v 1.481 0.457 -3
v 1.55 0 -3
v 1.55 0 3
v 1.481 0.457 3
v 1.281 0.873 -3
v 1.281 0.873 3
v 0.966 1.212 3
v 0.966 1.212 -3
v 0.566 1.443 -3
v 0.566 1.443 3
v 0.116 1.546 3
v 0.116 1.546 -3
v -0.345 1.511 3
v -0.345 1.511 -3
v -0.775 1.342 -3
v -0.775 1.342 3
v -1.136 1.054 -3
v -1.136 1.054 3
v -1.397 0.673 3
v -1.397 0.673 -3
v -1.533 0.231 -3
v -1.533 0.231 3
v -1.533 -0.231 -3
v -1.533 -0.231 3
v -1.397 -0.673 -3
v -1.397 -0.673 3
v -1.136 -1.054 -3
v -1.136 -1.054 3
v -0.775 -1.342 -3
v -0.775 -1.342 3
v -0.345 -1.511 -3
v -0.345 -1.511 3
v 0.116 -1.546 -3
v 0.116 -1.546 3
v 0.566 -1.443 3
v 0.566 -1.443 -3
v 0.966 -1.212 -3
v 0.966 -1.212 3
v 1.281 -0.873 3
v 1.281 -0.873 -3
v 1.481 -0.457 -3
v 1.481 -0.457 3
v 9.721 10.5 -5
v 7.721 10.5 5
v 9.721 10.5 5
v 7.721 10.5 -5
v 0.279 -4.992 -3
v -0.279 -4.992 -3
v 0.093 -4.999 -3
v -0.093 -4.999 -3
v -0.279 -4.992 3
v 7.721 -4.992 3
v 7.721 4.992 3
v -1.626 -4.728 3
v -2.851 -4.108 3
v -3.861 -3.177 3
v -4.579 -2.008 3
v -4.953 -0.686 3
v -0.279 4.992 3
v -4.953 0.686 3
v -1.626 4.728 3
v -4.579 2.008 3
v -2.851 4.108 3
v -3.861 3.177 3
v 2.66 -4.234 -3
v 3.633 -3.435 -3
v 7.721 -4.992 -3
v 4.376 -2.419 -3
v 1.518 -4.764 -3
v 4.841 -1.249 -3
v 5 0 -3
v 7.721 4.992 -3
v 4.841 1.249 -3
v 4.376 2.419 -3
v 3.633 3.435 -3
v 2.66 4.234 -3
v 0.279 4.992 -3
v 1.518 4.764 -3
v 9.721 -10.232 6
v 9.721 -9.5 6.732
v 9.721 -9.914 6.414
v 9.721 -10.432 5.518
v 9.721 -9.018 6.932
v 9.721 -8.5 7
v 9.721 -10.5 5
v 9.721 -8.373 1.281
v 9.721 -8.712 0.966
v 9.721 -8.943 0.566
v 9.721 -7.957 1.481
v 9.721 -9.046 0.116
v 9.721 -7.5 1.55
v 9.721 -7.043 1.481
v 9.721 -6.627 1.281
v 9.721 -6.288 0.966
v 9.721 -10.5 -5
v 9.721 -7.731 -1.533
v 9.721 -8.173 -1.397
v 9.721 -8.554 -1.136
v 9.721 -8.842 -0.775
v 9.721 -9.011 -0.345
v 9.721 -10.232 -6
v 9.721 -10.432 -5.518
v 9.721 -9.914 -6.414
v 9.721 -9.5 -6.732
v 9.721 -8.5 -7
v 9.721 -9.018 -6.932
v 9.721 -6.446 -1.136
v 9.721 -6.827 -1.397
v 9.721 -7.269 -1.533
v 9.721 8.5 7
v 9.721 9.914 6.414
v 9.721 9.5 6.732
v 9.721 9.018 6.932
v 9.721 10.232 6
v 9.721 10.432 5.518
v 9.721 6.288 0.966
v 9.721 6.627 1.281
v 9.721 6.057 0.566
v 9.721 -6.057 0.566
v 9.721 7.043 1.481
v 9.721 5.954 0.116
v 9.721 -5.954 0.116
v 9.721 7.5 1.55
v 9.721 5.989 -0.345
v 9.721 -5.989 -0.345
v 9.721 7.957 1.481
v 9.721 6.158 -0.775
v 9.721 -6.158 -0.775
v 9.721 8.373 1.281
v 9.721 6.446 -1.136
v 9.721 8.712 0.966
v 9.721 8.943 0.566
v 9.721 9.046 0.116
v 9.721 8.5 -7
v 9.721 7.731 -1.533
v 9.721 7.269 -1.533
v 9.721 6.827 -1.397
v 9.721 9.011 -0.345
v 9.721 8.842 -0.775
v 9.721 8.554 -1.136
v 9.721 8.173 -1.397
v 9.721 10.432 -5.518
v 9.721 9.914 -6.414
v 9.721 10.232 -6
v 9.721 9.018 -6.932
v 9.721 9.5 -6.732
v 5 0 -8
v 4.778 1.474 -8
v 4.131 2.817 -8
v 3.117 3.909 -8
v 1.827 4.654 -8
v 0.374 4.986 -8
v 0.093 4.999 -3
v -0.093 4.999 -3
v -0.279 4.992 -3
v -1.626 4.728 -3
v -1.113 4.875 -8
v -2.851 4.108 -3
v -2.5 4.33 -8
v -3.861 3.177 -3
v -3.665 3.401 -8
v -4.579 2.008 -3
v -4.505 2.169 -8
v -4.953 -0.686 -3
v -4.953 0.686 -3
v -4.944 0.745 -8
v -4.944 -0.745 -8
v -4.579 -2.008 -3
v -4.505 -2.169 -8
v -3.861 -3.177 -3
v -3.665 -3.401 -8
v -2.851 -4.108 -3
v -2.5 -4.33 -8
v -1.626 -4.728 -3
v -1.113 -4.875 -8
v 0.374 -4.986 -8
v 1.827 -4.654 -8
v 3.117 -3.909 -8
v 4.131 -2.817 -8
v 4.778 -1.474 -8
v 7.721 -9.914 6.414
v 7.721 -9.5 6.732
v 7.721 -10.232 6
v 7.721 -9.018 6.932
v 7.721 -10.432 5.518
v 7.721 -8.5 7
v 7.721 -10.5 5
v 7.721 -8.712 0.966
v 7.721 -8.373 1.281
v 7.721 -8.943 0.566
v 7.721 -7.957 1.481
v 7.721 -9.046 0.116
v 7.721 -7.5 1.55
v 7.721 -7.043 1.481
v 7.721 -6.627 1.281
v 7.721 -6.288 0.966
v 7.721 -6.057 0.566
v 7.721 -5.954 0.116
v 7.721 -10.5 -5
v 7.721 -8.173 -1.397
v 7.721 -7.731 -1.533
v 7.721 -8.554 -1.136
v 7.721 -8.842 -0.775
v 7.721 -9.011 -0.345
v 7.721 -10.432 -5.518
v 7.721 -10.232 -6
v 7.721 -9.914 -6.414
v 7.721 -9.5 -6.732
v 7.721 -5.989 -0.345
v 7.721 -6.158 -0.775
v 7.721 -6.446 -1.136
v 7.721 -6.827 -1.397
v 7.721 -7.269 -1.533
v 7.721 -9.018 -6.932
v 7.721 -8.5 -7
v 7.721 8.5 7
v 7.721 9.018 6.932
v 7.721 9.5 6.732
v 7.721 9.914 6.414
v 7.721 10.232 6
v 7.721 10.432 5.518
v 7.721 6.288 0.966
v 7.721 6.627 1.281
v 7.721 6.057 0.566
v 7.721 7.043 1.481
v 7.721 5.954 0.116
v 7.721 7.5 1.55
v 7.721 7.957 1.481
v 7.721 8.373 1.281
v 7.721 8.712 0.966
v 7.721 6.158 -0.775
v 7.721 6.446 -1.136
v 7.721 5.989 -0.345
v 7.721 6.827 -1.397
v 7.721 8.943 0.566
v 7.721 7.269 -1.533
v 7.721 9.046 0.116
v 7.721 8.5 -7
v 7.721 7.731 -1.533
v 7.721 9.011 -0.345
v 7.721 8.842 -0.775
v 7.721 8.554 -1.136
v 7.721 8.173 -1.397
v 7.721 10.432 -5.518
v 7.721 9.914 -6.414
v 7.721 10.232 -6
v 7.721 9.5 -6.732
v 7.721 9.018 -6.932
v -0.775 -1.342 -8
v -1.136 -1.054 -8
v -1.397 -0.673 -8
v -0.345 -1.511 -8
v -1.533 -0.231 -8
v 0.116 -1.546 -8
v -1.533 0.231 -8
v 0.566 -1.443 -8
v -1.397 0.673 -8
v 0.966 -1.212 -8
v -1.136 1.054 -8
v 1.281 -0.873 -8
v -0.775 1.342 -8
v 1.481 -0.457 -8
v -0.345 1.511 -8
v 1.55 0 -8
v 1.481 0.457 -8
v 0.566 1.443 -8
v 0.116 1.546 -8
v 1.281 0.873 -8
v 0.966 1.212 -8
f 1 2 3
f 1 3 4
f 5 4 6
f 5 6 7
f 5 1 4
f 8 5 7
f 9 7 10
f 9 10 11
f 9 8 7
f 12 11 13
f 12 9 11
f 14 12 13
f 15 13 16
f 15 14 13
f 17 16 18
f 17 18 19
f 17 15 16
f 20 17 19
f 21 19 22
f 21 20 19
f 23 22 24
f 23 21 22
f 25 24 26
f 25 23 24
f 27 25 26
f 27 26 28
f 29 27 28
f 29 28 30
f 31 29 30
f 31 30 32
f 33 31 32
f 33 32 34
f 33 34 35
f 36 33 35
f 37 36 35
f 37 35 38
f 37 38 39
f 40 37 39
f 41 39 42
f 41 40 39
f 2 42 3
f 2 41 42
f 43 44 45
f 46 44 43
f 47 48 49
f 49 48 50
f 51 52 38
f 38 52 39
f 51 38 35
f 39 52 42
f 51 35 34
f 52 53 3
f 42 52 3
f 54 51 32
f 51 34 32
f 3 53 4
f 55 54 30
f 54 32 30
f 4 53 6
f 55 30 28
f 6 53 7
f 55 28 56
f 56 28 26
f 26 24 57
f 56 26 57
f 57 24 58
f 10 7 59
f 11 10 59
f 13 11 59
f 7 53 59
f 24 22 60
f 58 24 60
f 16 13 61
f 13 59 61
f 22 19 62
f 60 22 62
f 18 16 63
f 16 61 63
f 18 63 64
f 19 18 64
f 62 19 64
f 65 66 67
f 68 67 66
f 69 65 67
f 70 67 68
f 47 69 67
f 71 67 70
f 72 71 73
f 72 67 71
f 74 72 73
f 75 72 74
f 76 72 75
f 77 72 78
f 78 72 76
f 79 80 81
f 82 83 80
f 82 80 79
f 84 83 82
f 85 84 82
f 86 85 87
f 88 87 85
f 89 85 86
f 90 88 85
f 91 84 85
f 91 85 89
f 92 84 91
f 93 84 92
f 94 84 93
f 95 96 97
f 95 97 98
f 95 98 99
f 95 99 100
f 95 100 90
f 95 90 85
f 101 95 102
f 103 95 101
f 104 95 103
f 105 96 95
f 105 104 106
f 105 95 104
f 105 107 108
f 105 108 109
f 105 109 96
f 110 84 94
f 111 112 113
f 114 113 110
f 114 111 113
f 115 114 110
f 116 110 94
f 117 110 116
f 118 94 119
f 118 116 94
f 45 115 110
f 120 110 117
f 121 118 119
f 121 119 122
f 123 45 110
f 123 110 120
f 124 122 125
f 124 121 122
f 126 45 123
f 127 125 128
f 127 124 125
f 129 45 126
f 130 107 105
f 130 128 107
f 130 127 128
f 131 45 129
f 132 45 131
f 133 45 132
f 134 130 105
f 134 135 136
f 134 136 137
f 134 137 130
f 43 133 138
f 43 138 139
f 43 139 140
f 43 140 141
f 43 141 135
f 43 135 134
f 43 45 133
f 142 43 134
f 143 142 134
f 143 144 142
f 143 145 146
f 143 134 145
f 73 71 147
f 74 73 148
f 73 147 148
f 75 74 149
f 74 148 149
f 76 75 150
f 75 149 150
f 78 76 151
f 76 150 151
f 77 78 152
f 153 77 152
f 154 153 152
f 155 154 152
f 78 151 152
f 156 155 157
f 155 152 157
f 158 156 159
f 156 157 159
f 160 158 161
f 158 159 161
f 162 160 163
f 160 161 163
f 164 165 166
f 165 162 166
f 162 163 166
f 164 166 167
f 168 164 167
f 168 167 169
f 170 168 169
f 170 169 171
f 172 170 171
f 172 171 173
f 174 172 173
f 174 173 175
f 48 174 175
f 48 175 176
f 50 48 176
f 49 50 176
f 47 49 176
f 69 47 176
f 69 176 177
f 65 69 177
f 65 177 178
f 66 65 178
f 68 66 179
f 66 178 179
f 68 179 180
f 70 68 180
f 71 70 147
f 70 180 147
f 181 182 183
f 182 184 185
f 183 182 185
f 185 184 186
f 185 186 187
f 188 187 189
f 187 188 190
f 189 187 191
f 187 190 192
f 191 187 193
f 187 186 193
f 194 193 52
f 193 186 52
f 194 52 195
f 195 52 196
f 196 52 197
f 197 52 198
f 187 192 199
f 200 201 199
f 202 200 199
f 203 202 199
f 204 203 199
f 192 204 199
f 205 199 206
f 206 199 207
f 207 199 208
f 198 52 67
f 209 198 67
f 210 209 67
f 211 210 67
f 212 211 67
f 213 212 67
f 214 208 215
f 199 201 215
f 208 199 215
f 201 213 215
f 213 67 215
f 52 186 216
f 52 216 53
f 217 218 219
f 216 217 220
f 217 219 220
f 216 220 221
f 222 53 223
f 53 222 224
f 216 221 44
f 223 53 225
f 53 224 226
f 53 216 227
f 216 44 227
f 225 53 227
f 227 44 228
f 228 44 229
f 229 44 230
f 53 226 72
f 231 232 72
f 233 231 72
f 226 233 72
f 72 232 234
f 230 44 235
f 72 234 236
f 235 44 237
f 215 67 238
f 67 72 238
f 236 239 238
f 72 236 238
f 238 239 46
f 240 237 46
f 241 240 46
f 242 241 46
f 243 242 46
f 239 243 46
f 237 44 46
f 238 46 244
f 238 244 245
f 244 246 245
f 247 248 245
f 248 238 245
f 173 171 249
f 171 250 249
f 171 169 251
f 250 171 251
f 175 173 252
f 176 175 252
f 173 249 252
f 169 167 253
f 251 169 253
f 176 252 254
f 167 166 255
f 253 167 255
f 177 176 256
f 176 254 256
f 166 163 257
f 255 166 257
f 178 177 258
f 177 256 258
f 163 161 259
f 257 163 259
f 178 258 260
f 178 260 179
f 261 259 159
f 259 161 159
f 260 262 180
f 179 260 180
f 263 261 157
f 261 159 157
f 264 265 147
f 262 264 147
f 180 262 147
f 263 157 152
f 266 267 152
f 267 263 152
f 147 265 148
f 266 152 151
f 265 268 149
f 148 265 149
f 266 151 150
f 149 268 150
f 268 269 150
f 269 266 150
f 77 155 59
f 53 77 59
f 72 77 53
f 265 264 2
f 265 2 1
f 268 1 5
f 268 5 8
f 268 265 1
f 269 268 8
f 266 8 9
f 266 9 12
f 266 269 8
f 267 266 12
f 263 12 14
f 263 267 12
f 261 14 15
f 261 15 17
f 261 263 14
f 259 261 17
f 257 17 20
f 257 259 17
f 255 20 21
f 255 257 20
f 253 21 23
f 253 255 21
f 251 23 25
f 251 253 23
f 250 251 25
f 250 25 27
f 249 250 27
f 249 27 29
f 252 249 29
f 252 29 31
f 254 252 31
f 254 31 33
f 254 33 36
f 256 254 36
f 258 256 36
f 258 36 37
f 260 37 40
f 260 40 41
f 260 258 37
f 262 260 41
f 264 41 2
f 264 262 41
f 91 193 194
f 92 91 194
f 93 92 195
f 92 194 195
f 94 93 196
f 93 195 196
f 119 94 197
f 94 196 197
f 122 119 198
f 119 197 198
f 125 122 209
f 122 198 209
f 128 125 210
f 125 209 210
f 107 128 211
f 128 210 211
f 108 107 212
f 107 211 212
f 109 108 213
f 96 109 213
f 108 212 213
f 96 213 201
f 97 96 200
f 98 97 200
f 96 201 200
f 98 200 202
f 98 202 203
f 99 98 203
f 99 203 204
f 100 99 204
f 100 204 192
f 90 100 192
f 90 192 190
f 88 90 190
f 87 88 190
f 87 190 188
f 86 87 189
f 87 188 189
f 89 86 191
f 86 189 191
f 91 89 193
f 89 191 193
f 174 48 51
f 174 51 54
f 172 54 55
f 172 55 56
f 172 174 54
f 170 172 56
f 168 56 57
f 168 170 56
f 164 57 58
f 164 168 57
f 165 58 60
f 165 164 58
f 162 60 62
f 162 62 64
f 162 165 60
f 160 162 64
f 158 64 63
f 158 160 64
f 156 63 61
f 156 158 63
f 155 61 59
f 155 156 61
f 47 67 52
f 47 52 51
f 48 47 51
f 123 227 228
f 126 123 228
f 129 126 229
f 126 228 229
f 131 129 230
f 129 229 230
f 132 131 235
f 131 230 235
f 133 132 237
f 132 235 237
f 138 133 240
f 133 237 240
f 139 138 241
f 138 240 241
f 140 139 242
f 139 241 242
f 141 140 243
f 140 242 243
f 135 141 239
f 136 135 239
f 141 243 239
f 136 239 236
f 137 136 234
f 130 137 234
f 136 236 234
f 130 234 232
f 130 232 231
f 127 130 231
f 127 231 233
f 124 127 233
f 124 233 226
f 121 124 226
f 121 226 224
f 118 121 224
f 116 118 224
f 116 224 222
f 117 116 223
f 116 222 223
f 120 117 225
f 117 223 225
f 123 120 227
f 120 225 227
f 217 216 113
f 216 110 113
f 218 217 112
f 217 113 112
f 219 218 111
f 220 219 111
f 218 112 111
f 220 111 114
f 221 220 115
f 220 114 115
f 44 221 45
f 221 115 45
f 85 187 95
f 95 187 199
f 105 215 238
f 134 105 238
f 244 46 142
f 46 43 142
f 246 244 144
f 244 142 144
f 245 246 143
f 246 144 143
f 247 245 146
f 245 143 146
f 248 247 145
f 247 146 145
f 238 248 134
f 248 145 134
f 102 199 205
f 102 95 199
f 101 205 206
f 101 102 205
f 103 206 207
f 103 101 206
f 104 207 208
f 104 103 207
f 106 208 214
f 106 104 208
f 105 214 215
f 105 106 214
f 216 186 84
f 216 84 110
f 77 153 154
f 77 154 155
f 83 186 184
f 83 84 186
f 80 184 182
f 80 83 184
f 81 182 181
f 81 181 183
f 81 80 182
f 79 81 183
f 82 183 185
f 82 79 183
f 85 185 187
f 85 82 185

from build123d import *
from build123d.topology import SkipClean

# Parameters (mm, degrees)
BOSS_EXTRU_1_DEPTH      = 3
BOSS_EXTRU_1_DEPTH_BACK = 3
ESQUISSE1_R             = 1.55
SKETCH1_W               = 14
SKETCH1_H               = 21
BOSS_EXTRUDE1_DEPTH     = 2
SKETCH3_R               = 1.55
CUT_EXTRUDE1_DEPTH      = 2
FILLET1_R               = 2
BOSS_EXTRUDE3_START     = -5
SKETCH4_R               = 5
SKETCH4_R_2             = 1.55
BOSS_EXTRUDE3_DEPTH     = 5


with BuildPart() as part:
    # Esquisse1 → Boss.-Extru.1 (new, two sides: drawn at the far end of the back side and taken through both)
    with BuildSketch(Plane.XY.offset(-BOSS_EXTRU_1_DEPTH_BACK)):
        with BuildLine():
            Line((-0.279242011, 4.9921963), (7.720757989, 4.9921963))
            Line((7.720757989, 4.9921963), (7.720757989, -4.9921963))
            Line((7.720757989, -4.9921963), (-0.279242011, -4.9921963))
            ThreePointArc((-0.279242011, -4.9921963), (-5, 0), (-0.279242011, 4.9921963))
        make_face()
        Circle(ESQUISSE1_R, mode=Mode.SUBTRACT)
    extrude(amount=BOSS_EXTRU_1_DEPTH + BOSS_EXTRU_1_DEPTH_BACK)

    # Sketch1 → Boss-Extrude1 (add)
    with BuildSketch(Plane(origin=(7.720757989, 0, 0), x_dir=(0, 0, -1), z_dir=(1, 0, 0))):
        Rectangle(SKETCH1_W, SKETCH1_H)
    extrude(amount=BOSS_EXTRUDE1_DEPTH)

    # Sketch3 → Cut-Extrude1 (cut)
    with BuildSketch(Plane.ZY.offset(-7.720757989)):
        with Locations((0, 7.5)):
            Circle(SKETCH3_R)
        with Locations((0, -7.5)):
            Circle(SKETCH3_R)
    extrude(amount=-CUT_EXTRUDE1_DEPTH, mode=Mode.SUBTRACT)

    # Fillet1
    fillet1_edges = [part.edges().sort_by_distance(p)[0] for p in [
        (8.720757989, -10.5, -7),
        (8.720757989, 10.5, -7),
        (8.720757989, 10.5, 7),
        (8.720757989, -10.5, 7),
    ]]
    fillet(fillet1_edges, radius=FILLET1_R)

    # Sketch4 → Boss-Extrude3 (add)
    with SkipClean():  # the faces are left unmerged after this step: merging them gives an invalid solid
        with BuildSketch(Plane.XY.offset(-3).offset(BOSS_EXTRUDE3_START)):
            Circle(SKETCH4_R)
            Circle(SKETCH4_R_2, mode=Mode.SUBTRACT)
        extrude(amount=BOSS_EXTRUDE3_DEPTH)


solid = part.part
